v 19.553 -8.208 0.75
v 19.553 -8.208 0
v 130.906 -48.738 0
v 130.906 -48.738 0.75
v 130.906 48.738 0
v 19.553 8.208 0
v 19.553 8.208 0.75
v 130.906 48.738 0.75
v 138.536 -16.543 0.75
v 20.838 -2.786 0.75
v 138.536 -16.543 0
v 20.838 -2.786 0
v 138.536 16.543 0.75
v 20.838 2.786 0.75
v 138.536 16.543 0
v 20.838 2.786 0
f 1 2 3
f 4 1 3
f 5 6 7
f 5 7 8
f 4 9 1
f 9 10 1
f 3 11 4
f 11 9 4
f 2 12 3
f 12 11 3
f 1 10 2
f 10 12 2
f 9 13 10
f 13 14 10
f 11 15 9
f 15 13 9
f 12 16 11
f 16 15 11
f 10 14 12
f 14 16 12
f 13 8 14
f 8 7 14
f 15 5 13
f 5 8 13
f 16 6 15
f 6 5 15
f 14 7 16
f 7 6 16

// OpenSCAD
reso = 100;

d_int_fix = 40;
d_ext_fix = 70;
h_fix = 5;

r_abat = 150;
d_abat = 4;
h_abat = 5;
ang_abat = 40;

ep_fen = 20;
ep_fen_int = 25;
h_fen = .750;

ang_abat_fix = 19;

module fix() {
    difference() {
        cylinder(r=d_ext_fix/2, $fn=reso, h=h_fix);
        cylinder(r=d_int_fix/2, $fn=reso, h=h_fix);
        apat_complet();
    }
}

module abat_2(){
    translate([-d_abat-d_int_fix/2,0,0])rotate([0,0,-ang_abat/2])
        rotate_extrude(angle=ang_abat, convexity=10) {
            translate([d_abat+d_int_fix/2,0,0])
                square([r_abat, h_abat]);
        }   
}

module abat_fenetre(){
    translate([-d_abat+ep_fen-d_int_fix/2,0,1])rotate([0,0,-ang_abat/2])
        rotate_extrude(angle=ang_abat, convexity=10) {
            translate([d_abat+d_int_fix/2,0,0])
                square([r_abat-ep_fen*1.5, h_abat]);
        }   
}

module abat_fenetre_int(){
    translate([-d_abat+ep_fen_int-d_int_fix/2,0,0])rotate([0,0,-ang_abat/2])
        rotate_extrude(angle=ang_abat, convexity=10) {
            translate([d_abat+d_int_fix/2,0,0])
                square([r_abat-ep_fen_int*1.5, h_abat]);
        }   
}

module fenetre_int(){
    translate([-d_abat+ep_fen+1-d_int_fix/2,0,0])rotate([0,0,-ang_abat/2])
        rotate_extrude(angle=ang_abat, convexity=10) {
            translate([d_abat+d_int_fix/2,0,0])
                square([r_abat-(ep_fen+1)*1.5, h_fen]);
        }   
}

module abat_1() {
    difference() {
        abat_2();
        abat_fenetre();
        abat_fenetre_int();
    }
}

module abat() {
    translate([d_abat+1+d_int_fix/2,0,h_abat-1])rotate([0,ang_abat_fix,0])
        abat_1();
}

module apat_complet() {
   for (a =[0:3]) {
       rotate(90*a) abat();
   }
}

fenetre_int();
//abat_1();
//fix();
